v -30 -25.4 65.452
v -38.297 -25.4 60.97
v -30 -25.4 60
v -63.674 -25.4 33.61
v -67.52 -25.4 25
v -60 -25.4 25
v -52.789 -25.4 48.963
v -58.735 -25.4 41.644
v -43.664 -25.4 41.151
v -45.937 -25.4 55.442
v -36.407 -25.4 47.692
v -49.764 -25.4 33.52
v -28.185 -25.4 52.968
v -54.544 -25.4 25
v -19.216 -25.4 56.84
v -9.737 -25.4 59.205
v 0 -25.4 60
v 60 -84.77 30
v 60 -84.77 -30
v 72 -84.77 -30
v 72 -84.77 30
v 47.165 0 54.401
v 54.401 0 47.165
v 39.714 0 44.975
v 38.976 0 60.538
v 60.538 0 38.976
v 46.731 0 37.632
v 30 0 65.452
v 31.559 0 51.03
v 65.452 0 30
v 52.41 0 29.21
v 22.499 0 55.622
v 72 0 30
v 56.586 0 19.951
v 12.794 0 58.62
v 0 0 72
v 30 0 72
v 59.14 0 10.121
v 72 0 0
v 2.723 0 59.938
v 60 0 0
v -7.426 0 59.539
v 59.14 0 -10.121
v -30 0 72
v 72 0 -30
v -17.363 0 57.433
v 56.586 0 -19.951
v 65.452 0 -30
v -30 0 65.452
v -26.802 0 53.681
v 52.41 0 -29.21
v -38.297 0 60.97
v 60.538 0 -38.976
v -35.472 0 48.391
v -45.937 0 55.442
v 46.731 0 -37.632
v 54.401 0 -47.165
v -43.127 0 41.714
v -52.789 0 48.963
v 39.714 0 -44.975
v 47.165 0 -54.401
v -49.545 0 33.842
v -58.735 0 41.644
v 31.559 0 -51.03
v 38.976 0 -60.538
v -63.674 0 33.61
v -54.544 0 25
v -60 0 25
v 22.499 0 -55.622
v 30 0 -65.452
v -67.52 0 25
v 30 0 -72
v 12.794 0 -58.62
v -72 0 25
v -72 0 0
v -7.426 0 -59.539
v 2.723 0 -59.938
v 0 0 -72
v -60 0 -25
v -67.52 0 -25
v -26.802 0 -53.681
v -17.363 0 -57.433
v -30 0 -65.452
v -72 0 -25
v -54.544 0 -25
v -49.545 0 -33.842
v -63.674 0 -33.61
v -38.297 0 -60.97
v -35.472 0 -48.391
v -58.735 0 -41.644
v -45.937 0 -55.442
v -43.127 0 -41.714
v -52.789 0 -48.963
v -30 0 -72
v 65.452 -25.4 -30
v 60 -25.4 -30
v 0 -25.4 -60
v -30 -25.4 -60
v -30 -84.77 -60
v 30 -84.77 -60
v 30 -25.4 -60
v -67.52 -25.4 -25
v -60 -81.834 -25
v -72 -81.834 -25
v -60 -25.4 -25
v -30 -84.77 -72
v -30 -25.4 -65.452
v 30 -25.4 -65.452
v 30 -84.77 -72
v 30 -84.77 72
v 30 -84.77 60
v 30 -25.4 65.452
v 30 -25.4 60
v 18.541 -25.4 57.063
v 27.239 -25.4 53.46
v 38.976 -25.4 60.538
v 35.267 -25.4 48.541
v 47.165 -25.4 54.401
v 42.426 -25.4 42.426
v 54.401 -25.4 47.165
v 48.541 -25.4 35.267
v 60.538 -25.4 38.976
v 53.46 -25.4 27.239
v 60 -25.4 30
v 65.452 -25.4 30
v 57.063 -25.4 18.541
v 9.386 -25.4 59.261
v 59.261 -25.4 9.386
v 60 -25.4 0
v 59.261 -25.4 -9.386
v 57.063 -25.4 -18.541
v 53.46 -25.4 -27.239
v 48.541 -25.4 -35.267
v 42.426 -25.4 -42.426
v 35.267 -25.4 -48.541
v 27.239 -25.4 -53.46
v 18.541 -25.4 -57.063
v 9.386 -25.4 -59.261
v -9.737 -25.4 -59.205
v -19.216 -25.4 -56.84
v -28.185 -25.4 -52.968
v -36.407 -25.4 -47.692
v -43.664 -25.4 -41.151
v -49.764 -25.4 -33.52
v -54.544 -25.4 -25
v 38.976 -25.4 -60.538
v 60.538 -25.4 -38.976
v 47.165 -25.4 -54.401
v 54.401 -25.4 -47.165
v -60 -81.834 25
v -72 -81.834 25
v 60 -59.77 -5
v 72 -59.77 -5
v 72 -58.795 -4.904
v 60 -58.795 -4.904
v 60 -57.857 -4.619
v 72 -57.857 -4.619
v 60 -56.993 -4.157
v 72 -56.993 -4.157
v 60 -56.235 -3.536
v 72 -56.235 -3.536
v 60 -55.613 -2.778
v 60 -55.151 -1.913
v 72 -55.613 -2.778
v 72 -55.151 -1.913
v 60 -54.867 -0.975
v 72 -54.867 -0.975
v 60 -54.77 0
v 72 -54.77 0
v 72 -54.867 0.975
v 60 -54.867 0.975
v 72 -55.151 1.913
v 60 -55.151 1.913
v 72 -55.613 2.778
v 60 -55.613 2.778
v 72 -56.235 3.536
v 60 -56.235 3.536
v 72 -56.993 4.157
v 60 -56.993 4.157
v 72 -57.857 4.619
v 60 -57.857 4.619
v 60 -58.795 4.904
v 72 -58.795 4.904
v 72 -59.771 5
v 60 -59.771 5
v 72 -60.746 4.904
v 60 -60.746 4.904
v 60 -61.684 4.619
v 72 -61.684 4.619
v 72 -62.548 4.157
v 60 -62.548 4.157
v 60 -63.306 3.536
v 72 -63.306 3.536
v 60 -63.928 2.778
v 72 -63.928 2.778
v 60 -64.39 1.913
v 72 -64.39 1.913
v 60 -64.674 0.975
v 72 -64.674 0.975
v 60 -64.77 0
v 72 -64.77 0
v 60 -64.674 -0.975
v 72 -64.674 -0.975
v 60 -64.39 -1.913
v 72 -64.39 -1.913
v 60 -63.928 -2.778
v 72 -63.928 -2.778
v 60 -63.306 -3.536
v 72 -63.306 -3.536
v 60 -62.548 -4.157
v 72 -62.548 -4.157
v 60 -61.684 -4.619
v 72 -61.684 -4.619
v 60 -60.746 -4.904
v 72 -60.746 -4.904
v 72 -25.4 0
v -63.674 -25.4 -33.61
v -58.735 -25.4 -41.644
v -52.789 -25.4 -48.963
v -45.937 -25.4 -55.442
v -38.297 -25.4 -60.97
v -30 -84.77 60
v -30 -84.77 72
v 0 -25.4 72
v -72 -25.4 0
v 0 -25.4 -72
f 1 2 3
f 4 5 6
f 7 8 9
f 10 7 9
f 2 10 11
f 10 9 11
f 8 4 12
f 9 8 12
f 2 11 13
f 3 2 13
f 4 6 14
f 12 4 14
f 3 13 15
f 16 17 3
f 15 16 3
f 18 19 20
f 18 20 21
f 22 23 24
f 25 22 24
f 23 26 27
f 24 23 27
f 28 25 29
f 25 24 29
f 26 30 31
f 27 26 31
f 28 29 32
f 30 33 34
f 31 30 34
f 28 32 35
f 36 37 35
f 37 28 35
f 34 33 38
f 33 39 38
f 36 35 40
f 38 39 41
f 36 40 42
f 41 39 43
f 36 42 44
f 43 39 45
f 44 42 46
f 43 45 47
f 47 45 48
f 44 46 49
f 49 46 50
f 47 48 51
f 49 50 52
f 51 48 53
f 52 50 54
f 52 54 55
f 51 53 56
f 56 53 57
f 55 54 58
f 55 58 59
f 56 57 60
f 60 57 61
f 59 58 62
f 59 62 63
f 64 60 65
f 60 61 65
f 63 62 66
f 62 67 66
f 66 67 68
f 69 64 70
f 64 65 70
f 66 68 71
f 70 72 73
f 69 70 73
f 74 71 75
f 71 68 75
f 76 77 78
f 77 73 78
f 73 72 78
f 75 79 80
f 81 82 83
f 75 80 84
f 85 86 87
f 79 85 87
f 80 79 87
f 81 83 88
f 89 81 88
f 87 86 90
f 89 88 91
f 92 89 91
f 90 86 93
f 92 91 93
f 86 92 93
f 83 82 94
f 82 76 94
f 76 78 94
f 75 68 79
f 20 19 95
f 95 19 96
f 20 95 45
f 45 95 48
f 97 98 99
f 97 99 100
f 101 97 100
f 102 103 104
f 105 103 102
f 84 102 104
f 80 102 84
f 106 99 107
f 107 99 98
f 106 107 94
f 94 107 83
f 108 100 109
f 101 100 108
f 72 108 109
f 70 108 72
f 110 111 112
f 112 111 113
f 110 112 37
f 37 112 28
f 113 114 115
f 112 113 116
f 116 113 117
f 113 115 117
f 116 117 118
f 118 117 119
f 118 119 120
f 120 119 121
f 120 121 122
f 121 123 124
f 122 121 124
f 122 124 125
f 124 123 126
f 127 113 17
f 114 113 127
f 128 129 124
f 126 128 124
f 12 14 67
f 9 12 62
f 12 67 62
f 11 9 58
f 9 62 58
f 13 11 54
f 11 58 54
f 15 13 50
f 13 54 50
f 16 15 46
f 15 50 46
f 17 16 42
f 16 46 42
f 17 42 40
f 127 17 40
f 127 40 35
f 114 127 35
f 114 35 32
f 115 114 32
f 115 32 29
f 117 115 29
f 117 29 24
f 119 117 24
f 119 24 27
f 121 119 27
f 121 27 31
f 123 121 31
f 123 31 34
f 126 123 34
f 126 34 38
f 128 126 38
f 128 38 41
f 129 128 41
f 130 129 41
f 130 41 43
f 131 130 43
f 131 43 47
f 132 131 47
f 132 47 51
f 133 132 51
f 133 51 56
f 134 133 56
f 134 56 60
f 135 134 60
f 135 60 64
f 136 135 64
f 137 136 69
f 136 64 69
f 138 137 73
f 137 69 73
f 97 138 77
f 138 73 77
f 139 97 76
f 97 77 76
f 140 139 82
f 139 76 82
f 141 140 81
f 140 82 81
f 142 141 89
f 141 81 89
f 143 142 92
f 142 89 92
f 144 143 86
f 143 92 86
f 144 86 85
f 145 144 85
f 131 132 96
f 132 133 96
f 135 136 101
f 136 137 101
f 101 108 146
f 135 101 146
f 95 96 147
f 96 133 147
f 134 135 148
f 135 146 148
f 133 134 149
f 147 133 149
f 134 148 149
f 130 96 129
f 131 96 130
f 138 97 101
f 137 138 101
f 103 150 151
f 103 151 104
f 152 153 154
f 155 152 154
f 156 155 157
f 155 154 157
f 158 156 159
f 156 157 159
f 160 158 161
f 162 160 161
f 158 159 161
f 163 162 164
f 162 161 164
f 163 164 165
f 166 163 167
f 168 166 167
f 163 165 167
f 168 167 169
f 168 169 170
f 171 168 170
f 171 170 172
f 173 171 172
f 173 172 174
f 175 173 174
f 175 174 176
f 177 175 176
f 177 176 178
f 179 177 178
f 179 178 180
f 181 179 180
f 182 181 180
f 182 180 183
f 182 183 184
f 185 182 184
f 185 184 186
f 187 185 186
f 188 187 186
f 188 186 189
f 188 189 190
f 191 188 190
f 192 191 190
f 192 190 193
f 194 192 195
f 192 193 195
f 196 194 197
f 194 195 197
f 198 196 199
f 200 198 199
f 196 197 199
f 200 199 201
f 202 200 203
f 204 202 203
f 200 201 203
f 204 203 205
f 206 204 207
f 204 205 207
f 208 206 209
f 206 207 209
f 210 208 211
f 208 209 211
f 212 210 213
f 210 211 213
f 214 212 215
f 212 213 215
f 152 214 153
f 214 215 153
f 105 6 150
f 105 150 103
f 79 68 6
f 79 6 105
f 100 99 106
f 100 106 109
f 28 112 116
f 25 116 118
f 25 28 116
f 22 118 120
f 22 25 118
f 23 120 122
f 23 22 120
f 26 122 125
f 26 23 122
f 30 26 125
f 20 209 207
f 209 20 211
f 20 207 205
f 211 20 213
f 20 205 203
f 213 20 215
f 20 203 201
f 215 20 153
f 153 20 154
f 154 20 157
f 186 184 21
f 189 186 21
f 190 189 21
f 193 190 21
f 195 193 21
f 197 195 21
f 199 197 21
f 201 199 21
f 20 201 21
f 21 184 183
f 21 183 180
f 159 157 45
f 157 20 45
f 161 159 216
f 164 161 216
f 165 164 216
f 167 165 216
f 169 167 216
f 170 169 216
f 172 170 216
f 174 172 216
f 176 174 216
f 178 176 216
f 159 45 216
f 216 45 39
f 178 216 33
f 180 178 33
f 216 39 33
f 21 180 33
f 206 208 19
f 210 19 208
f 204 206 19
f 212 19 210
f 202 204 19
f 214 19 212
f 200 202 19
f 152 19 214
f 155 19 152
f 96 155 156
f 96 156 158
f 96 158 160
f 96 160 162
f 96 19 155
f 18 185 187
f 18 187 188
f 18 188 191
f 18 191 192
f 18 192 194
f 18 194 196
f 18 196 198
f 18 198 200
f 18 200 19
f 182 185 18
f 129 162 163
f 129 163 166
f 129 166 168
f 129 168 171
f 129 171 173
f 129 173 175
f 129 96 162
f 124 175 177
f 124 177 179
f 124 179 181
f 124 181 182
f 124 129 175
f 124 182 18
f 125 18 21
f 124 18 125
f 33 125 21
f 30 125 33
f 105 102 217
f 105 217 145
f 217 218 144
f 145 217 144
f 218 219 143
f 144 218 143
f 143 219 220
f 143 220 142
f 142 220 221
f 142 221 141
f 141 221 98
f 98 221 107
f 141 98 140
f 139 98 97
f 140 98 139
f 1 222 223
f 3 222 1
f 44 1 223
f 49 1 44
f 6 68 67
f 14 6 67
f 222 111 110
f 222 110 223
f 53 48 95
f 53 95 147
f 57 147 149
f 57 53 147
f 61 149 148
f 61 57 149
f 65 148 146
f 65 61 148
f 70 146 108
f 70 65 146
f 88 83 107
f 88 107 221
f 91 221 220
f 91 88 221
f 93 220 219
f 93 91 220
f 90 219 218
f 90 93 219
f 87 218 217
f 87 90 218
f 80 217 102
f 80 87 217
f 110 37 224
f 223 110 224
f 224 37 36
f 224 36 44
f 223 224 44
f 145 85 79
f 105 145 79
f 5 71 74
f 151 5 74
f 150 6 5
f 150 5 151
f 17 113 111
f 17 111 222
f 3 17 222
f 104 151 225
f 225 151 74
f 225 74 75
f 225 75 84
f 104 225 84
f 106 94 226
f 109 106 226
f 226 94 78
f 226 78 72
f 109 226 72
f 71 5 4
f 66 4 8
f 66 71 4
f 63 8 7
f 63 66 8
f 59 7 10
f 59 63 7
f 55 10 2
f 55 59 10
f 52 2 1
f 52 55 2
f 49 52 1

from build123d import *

# Parameters (mm, degrees)
SKETCH1_R                       = 72
SKETCH1_R_2                     = 60
BOSS_EXTRUDE1_DEPTH             = 25.4
BOSS_EXTRUDE4_DEPTH             = 12
CUT_EXTRUDE1_DEPTH              = 25.4
SKETCH8_W                       = 60
SKETCH8_H                       = 84.7705
BOSS_EXTRUDE5_DEPTH             = 12
CIRPATTERN4_COUNT               = 2
CIRPATTERN4_ANGLE               = 90
CIRPATTERN4_THE_OTHER_WAY_COUNT = 2
CIRPATTERN4_THE_OTHER_WAY_ANGLE = 90
M8_CLEARANCE_HOLE1_D            = 10
M8_CLEARANCE_HOLE1_DEPTH        = 12


with BuildPart() as part:
    # Sketch1 → Boss-Extrude1 (new body)
    with BuildSketch(Plane(origin=(0, 0, 0), x_dir=(1, 0, 0), z_dir=(0, 1, 0))):
        Circle(SKETCH1_R)
        Circle(SKETCH1_R_2, mode=Mode.SUBTRACT)
    extrude(amount=-BOSS_EXTRUDE1_DEPTH)

    # Sketch7 → Boss-Extrude4 (add)
    with BuildSketch(Plane(origin=(-60, 0, 0), x_dir=(0, 0, -1), z_dir=(1, 0, 0))):
        Polygon((-25, -25.4), (-25, -81.8336), (25, -81.8336), (25, -25.4), (25, 0), (-25, 0), align=None)
    extrude(amount=-BOSS_EXTRUDE4_DEPTH)

    # Sketch15 → Cut-Extrude1 (cut)
    with BuildSketch(Plane.XZ.offset(25.4)):
        Polygon((-60, 25), (-54.543560573, 25), (-54.543560573, -25), (-60, -25), (-60, 0), align=None)
    extrude(amount=-CUT_EXTRUDE1_DEPTH, mode=Mode.SUBTRACT)

    # Sketch8 → Boss-Extrude5 (add)
    with BuildSketch(Plane.ZY.offset(-60)):
        with Locations((0, -42.38525)):
            Rectangle(SKETCH8_W, SKETCH8_H)
    boss_extrude5 = extrude(amount=-BOSS_EXTRUDE5_DEPTH)

    # CirPattern4: Boss-Extrude5 ×2 about axis
    cirpattern4_axis = Axis((0, 0, 0), (0, 1, 0))
    for i in range(1, CIRPATTERN4_COUNT):
        add(boss_extrude5.rotate(cirpattern4_axis, i * CIRPATTERN4_ANGLE / (CIRPATTERN4_COUNT - 1)))

    # CirPattern4 the other way: Boss-Extrude5 ×2 about axis
    cirpattern4_the_other_way_axis = Axis((0, 0, 0), (0, -1, 0))
    for i in range(1, CIRPATTERN4_THE_OTHER_WAY_COUNT):
        add(boss_extrude5.rotate(cirpattern4_the_other_way_axis, i * CIRPATTERN4_THE_OTHER_WAY_ANGLE / (CIRPATTERN4_THE_OTHER_WAY_COUNT - 1)))

    # M8 Clearance Hole1
    with Locations(Plane.ZY.offset(-60)):
        with Locations((0, -59.7705)):
            Hole(M8_CLEARANCE_HOLE1_D / 2, depth=M8_CLEARANCE_HOLE1_DEPTH)


solid = part.part
